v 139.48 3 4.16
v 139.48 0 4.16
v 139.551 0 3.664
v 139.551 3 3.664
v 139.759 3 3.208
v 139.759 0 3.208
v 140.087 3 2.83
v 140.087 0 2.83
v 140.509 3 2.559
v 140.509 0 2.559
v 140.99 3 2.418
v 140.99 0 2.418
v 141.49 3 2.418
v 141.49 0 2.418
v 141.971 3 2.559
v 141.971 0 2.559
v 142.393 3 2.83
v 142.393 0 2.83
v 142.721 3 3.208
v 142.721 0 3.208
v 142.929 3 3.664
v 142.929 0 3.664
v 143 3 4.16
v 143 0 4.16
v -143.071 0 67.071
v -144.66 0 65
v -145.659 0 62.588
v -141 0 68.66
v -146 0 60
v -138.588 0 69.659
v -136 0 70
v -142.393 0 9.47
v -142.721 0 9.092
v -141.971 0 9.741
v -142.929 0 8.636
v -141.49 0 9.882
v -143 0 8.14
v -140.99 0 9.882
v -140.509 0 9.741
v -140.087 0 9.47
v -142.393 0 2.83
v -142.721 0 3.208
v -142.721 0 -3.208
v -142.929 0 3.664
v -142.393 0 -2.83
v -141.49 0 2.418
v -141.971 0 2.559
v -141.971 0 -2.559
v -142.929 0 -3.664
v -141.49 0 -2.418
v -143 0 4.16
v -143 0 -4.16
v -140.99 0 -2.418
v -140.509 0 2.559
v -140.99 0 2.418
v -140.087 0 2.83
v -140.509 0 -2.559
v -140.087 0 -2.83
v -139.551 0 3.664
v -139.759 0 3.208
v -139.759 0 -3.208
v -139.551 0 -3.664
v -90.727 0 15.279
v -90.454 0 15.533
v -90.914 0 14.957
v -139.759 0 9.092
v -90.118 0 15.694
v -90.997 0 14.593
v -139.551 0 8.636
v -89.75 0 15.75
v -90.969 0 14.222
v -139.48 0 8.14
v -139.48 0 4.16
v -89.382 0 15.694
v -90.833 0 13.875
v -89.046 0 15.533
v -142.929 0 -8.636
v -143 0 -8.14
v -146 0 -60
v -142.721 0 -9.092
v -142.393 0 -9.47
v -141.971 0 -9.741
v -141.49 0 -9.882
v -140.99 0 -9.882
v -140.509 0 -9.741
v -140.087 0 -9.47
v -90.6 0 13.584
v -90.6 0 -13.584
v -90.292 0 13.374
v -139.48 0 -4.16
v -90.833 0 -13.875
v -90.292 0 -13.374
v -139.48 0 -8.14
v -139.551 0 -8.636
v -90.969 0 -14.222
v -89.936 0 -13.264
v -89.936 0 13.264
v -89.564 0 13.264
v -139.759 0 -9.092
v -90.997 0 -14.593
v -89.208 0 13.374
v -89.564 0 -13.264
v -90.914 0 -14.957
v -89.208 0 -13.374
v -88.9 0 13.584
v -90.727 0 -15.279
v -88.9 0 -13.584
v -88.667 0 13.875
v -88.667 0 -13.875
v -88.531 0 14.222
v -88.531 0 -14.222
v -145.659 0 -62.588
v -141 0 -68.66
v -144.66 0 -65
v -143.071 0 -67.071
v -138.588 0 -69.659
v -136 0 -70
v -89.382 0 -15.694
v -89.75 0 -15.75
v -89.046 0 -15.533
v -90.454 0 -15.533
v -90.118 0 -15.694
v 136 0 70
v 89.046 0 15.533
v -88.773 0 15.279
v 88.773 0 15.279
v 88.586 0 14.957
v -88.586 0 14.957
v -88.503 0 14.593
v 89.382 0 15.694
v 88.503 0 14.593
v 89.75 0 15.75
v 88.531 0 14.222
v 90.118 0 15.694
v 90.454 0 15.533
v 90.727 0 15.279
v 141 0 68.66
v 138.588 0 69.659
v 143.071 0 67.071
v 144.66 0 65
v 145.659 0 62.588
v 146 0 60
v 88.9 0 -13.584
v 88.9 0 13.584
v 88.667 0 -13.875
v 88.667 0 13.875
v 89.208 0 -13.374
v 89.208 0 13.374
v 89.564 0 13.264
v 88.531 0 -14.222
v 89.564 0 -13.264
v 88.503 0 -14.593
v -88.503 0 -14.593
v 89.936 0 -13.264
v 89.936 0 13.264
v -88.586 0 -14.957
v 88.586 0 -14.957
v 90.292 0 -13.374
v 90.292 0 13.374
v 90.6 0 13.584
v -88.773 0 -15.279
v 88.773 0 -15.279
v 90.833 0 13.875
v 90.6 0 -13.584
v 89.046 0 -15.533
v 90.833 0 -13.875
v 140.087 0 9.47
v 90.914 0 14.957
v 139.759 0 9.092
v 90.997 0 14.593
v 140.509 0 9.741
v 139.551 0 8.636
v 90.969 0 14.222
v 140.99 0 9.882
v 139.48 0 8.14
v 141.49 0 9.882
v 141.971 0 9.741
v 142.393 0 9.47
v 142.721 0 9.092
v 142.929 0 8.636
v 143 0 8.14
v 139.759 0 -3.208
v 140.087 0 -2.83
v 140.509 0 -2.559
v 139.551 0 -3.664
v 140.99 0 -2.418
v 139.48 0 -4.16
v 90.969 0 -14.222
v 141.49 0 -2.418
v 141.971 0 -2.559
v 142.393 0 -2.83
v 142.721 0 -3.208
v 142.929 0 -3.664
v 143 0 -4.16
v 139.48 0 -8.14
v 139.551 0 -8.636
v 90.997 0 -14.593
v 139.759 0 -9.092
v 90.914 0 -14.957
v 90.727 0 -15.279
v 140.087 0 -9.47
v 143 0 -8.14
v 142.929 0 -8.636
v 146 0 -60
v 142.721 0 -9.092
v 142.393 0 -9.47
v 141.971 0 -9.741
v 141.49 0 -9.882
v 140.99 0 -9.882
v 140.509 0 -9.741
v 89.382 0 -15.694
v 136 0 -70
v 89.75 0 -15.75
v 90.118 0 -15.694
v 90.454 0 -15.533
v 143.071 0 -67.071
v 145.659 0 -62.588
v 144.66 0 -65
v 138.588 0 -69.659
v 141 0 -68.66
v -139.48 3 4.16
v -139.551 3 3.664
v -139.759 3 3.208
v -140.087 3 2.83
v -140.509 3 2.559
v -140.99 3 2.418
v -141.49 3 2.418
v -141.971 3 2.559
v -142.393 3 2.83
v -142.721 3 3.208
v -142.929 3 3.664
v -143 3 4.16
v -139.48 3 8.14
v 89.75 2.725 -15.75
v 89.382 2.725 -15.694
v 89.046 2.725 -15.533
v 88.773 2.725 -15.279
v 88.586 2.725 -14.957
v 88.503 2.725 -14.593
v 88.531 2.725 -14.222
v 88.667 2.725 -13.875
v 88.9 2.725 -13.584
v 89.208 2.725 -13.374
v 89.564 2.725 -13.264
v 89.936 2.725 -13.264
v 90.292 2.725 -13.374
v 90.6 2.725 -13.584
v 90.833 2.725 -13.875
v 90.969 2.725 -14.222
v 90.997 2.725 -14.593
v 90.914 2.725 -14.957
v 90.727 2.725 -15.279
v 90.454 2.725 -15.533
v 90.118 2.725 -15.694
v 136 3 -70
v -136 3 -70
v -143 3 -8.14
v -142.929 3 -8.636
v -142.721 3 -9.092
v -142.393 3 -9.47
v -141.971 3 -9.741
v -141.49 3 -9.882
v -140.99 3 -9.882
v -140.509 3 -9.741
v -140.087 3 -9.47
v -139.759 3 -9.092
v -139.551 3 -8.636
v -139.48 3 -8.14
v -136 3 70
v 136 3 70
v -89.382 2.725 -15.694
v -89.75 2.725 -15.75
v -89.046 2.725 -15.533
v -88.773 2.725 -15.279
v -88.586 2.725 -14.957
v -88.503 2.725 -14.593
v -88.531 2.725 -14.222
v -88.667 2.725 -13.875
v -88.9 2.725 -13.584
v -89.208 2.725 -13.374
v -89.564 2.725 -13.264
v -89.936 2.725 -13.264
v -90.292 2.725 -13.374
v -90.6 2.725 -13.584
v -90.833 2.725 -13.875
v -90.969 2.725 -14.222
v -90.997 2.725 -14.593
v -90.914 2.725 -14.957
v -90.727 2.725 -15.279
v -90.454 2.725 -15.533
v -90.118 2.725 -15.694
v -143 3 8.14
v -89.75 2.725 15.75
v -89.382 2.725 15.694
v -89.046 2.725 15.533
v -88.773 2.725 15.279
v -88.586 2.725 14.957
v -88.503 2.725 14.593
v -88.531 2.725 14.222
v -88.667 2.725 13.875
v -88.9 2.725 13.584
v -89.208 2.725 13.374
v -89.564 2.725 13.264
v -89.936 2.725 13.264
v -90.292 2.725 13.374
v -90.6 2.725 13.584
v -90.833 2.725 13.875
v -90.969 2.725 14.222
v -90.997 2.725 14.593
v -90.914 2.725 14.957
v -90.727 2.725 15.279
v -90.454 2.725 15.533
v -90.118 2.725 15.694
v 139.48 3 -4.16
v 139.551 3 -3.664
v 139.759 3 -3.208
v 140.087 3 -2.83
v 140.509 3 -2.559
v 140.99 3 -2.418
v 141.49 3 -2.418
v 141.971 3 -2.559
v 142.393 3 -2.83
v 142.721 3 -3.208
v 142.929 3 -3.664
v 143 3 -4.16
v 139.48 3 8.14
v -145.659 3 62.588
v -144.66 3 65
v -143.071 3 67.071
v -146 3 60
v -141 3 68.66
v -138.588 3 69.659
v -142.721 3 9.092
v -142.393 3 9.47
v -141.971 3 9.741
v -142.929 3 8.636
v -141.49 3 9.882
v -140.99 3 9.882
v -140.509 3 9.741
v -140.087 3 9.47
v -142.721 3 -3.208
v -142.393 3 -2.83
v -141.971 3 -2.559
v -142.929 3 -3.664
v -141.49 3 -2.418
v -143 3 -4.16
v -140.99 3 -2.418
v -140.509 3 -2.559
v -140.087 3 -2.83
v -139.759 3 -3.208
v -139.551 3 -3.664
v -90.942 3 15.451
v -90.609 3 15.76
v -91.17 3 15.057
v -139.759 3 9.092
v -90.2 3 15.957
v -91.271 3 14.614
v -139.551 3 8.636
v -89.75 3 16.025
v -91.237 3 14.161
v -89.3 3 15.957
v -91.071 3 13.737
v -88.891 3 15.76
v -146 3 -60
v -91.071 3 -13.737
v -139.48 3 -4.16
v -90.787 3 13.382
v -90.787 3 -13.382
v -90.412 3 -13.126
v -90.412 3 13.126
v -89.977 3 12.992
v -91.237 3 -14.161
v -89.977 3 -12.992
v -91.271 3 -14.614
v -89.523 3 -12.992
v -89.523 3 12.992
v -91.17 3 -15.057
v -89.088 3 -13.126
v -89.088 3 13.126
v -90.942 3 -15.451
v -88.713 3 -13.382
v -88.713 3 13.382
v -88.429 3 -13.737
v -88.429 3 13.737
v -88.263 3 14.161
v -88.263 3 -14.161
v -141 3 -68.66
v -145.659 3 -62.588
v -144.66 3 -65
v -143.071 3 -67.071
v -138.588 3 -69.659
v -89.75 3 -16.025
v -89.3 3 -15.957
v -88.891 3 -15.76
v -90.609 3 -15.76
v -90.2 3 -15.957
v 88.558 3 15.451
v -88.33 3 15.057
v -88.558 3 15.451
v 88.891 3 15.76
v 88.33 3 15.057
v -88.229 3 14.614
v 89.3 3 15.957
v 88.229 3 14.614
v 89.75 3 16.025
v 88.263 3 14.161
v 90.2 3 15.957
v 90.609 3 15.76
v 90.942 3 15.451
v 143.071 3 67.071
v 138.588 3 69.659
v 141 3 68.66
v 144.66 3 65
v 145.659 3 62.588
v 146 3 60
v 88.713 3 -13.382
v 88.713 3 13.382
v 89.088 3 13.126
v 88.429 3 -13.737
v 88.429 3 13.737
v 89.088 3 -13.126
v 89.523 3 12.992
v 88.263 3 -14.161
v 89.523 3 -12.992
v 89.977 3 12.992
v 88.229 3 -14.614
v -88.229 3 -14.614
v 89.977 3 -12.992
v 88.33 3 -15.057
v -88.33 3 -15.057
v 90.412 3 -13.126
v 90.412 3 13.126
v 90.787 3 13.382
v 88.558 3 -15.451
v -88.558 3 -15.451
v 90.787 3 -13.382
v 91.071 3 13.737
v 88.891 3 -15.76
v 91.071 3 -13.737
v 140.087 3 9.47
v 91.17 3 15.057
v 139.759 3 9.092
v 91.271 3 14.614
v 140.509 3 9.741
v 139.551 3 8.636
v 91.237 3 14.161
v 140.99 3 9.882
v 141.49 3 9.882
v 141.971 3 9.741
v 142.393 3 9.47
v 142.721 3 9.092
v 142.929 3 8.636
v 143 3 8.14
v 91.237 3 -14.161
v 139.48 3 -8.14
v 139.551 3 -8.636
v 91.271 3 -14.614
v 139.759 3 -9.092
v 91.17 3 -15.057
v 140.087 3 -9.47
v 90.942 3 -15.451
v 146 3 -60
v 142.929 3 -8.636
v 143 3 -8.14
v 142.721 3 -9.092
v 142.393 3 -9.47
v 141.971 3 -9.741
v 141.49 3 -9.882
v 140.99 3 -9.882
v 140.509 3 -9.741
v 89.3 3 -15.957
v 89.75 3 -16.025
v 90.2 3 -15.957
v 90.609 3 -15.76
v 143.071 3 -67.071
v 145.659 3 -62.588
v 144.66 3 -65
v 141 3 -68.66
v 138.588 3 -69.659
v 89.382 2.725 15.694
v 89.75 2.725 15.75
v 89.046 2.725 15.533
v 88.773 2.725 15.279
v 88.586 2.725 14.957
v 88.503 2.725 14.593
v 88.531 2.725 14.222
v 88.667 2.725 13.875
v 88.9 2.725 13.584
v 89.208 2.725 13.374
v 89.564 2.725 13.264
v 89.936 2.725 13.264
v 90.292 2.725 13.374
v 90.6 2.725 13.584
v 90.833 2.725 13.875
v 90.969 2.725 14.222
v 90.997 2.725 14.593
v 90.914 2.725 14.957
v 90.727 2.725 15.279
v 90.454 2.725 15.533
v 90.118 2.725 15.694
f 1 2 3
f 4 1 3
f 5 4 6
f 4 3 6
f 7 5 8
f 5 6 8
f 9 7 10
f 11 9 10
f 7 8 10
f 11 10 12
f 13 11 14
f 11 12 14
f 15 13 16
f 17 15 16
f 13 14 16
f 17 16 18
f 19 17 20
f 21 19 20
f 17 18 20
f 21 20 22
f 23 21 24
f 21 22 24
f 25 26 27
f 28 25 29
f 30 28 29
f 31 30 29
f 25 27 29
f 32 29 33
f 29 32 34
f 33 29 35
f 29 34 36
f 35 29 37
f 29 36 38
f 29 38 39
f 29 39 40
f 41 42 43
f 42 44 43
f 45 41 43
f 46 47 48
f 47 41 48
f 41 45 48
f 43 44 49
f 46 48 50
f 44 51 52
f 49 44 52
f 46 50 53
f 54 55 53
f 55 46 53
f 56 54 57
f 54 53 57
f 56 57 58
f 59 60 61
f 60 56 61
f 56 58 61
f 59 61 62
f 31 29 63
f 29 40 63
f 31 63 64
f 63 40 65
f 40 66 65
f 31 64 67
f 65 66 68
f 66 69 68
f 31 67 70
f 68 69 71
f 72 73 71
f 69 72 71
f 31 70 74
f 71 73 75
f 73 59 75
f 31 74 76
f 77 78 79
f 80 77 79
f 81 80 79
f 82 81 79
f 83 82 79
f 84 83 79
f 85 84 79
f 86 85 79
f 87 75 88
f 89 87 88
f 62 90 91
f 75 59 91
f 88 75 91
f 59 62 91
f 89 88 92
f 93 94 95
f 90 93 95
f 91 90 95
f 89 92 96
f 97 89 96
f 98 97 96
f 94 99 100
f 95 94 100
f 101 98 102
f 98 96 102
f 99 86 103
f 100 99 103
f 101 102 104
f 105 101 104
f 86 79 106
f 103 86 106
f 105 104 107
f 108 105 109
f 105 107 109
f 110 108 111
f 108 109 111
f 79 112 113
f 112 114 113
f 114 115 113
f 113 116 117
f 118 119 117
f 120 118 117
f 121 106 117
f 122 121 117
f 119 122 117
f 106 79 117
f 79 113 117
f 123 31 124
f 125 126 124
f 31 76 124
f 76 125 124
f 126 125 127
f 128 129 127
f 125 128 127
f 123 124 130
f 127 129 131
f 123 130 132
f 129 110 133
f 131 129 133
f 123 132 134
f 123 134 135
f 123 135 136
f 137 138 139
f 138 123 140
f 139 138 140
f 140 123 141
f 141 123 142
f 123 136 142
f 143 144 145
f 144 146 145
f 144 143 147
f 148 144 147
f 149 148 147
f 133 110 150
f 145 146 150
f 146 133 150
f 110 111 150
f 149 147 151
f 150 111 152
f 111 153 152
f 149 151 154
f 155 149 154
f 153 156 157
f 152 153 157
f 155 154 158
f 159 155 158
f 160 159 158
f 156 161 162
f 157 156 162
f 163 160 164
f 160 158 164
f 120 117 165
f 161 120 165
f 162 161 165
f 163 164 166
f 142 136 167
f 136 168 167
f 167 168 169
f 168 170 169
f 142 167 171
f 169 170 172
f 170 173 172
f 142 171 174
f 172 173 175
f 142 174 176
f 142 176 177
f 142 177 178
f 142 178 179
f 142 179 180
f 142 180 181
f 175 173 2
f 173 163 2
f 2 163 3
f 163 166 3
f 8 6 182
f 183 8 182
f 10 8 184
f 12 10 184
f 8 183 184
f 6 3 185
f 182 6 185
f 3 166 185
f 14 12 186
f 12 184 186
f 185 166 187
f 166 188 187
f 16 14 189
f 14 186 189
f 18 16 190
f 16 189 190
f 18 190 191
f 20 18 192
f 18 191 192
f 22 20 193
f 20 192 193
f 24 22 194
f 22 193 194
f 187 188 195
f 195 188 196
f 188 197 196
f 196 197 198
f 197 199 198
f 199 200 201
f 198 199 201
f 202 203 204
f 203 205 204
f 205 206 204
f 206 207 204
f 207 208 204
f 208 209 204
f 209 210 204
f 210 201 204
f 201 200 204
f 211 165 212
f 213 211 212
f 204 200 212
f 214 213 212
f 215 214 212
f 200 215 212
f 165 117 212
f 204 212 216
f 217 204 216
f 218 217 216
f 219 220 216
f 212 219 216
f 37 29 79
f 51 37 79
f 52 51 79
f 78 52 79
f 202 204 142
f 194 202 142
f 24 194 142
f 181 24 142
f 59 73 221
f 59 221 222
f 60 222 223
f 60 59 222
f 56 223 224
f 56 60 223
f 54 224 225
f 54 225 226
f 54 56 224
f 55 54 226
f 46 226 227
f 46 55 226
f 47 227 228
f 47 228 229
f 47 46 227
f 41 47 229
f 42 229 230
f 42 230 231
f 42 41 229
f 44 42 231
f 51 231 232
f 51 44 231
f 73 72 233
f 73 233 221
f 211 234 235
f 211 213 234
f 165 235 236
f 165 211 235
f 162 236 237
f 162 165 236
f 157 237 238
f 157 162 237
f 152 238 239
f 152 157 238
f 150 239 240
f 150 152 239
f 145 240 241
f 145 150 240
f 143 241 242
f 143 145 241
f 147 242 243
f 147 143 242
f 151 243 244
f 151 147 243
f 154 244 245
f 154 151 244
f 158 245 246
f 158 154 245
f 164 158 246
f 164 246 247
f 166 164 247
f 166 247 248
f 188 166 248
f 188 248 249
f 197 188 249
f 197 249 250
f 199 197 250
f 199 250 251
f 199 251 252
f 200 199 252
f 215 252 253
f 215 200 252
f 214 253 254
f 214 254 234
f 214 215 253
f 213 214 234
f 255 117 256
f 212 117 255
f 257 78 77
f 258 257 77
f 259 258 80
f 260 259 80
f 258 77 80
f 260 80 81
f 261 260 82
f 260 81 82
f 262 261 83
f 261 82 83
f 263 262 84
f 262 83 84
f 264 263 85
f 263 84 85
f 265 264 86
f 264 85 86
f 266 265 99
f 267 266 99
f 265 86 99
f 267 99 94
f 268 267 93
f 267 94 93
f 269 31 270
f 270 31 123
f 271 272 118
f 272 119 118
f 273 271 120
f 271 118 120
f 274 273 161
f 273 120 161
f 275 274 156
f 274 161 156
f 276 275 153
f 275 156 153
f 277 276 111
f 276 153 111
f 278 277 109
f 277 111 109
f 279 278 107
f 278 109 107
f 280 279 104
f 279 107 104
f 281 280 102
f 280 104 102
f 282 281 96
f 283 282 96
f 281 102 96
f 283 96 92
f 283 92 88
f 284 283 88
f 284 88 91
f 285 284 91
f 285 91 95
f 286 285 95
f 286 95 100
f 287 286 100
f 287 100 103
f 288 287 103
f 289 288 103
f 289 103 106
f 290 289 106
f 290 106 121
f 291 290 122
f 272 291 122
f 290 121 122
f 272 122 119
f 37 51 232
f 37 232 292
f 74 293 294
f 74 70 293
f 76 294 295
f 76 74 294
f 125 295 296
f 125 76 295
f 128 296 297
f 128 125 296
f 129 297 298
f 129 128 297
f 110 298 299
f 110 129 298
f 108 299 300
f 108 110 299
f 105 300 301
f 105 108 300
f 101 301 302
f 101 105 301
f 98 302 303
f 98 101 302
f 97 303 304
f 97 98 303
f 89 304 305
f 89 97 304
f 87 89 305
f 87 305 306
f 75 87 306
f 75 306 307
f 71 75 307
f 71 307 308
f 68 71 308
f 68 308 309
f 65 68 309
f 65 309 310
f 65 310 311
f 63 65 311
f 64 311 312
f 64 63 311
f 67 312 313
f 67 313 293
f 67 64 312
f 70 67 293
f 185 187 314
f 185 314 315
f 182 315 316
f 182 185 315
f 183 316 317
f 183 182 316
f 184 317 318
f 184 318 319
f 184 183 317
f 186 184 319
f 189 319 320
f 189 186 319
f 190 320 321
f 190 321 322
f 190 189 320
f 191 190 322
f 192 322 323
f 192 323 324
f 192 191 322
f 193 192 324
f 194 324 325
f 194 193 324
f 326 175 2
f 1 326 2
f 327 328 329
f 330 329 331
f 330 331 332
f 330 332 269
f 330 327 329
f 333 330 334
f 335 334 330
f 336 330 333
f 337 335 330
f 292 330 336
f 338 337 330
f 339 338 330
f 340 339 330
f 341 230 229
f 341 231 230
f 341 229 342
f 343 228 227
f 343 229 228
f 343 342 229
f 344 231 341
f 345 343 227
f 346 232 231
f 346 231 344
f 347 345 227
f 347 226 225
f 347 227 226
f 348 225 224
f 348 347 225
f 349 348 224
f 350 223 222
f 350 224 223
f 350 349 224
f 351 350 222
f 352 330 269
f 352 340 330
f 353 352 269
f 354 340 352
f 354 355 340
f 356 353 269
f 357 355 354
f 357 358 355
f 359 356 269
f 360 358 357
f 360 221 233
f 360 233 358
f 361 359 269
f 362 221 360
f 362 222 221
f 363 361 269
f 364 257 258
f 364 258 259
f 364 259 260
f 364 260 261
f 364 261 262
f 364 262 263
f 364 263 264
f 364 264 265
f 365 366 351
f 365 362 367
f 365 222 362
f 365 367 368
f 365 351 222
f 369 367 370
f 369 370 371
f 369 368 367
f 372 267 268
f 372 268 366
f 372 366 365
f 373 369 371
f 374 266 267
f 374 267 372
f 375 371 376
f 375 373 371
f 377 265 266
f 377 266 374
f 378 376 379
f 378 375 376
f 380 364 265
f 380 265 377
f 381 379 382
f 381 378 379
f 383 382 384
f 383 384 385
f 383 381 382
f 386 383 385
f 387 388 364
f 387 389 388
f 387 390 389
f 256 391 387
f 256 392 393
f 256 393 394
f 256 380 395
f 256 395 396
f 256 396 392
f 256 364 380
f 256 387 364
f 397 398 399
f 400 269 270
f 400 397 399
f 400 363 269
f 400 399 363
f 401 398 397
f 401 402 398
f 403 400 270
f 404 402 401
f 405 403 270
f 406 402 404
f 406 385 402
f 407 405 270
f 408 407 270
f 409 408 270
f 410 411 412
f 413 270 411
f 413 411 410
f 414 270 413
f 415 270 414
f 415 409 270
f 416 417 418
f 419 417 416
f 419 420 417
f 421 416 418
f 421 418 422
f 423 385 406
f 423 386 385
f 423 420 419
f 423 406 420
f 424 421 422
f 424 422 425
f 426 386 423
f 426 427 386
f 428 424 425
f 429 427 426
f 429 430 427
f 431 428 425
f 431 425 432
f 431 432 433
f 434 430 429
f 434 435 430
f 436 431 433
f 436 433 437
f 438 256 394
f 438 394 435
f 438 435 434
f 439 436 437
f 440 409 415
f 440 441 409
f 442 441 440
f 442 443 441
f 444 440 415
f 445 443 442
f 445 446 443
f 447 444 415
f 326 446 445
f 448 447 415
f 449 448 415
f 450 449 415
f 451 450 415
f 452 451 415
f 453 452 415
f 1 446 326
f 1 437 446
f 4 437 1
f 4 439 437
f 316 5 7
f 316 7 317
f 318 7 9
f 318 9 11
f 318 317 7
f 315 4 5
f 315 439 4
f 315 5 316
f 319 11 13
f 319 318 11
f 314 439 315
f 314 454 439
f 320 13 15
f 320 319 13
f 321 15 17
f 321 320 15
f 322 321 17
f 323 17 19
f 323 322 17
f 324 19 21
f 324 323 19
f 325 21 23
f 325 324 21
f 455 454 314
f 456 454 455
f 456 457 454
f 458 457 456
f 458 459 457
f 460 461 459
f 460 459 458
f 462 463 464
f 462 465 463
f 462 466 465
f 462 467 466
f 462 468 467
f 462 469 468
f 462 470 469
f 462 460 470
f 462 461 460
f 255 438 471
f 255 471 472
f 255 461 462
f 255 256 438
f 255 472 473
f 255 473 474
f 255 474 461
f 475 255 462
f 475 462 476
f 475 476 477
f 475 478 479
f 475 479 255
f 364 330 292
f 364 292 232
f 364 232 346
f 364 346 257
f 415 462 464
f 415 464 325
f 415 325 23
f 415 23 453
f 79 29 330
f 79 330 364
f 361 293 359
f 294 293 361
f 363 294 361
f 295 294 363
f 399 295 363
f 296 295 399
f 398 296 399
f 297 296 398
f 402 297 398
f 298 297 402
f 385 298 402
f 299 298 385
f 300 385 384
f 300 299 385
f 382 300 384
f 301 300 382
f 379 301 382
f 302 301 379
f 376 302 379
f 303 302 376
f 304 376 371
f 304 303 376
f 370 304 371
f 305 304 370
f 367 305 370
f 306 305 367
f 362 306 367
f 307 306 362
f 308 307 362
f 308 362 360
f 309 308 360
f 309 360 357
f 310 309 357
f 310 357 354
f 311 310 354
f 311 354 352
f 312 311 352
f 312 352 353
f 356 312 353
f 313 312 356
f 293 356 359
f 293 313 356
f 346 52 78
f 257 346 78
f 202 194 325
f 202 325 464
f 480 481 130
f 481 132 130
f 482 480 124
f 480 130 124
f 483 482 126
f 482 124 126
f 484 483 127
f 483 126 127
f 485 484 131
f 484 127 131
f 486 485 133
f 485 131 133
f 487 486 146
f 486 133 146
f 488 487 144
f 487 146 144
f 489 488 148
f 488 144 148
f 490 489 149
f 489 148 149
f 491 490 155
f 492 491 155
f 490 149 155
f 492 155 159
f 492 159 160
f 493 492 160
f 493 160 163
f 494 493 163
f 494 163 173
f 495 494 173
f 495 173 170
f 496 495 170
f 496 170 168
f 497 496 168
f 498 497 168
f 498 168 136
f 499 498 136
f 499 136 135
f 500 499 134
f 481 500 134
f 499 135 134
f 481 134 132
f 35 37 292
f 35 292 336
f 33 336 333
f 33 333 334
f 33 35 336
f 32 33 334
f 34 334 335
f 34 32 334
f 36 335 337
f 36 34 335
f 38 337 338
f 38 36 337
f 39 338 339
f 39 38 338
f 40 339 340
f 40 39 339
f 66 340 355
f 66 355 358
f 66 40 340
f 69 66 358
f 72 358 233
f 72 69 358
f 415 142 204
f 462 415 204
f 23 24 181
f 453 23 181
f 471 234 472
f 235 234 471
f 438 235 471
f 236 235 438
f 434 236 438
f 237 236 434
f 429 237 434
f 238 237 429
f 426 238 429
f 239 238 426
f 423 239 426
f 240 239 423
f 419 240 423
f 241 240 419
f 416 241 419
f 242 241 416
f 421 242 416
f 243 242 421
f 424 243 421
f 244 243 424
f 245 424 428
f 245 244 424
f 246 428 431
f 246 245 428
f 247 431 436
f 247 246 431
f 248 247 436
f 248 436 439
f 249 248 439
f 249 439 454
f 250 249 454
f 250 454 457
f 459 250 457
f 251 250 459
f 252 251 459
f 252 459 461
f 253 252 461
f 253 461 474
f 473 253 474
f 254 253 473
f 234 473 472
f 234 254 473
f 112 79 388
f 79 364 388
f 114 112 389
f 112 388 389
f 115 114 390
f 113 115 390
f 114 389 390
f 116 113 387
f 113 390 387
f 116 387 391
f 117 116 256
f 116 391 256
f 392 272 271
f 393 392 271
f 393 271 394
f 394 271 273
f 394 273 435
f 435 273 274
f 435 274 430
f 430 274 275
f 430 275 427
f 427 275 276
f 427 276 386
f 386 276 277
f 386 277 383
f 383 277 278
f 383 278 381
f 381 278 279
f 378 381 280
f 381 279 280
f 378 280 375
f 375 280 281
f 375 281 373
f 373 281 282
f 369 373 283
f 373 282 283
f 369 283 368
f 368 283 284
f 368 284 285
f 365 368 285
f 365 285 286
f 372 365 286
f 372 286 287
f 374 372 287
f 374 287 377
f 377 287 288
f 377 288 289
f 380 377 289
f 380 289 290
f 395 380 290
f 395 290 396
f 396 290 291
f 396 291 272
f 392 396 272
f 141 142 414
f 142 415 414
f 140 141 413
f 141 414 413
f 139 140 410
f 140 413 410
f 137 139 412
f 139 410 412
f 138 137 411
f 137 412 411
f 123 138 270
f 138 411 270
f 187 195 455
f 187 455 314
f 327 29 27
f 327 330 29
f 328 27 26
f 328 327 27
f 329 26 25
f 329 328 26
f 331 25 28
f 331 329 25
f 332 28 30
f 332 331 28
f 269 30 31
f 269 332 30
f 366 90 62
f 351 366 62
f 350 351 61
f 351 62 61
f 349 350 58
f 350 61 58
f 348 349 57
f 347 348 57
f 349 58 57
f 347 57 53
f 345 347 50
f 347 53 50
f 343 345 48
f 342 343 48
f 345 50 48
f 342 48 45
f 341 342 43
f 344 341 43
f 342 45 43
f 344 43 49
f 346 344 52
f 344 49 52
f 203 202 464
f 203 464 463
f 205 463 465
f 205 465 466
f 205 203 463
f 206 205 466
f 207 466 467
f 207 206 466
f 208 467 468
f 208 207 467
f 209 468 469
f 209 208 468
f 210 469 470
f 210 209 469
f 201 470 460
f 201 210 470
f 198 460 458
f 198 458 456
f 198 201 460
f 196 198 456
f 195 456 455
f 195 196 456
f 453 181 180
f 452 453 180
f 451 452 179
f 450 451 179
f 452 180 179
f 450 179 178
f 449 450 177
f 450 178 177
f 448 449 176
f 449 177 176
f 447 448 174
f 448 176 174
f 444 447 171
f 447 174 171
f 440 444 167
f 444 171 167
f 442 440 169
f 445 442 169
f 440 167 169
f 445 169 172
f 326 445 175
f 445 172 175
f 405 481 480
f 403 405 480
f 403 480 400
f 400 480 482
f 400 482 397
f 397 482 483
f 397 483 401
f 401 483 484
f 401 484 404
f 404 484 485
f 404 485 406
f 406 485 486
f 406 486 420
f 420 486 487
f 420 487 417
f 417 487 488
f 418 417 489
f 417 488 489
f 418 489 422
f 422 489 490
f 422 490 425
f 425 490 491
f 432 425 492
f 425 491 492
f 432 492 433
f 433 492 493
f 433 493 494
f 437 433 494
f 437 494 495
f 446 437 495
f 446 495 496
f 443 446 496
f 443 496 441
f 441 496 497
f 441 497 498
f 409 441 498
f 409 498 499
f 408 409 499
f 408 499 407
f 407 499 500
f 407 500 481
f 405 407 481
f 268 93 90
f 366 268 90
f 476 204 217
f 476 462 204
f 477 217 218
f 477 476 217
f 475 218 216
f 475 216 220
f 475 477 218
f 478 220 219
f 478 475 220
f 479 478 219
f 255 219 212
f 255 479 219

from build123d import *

# Parameters (mm, degrees)
SKETCH_1_W                   = 292
SKETCH_1_H                   = 140
EXTRUDE_1_DEPTH              = 3
HOLE_WIZARD_M3_1_D           = 2.5
HOLE_WIZARD_M3_1_CSINK_D     = 3.05
HOLE_WIZARD_M3_1_CSINK_ANGLE = 90
MIRROR_2_COPY_1_D            = 2.5
MIRROR_2_COPY_1_CSINK_D      = 3.05
MIRROR_2_COPY_1_CSINK_ANGLE  = 90
FILLET_1_R                   = 10


with BuildPart() as part:
    # 草图1 → 凸台-拉伸1 (new body)
    with BuildSketch(Plane(origin=(0, 0, 0), x_dir=(1, 0, 0), z_dir=(0, 1, 0))):
        Rectangle(SKETCH_1_W, SKETCH_1_H)
        with BuildLine():
            Line((-139.48, 8.14), (-139.48, 4.16))
            ThreePointArc((-139.48, 4.16), (-141.24, 2.4), (-143, 4.16))
            Line((-143, 4.16), (-143, 8.14))
            ThreePointArc((-143, 8.14), (-141.24, 9.9), (-139.48, 8.14))
        make_face(mode=Mode.SUBTRACT)
        with BuildLine():
            Line((-139.48, -8.14), (-139.48, -4.16))
            ThreePointArc((-139.48, -4.16), (-141.24, -2.4), (-143, -4.16))
            Line((-143, -4.16), (-143, -8.14))
            ThreePointArc((-143, -8.14), (-141.24, -9.9), (-139.48, -8.14))
        make_face(mode=Mode.SUBTRACT)
        with BuildLine():
            Line((139.48, 8.14), (139.48, 4.16))
            ThreePointArc((139.48, 4.16), (141.24, 2.4), (143, 4.16))
            Line((143, 4.16), (143, 8.14))
            ThreePointArc((143, 8.14), (141.24, 9.9), (139.48, 8.14))
        make_face(mode=Mode.SUBTRACT)
        with BuildLine():
            Line((139.48, -8.14), (139.48, -4.16))
            ThreePointArc((139.48, -4.16), (141.24, -2.4), (143, -4.16))
            Line((143, -4.16), (143, -8.14))
            ThreePointArc((143, -8.14), (141.24, -9.9), (139.48, -8.14))
        make_face(mode=Mode.SUBTRACT)
    extrude(amount=EXTRUDE_1_DEPTH)

    # M3 螺纹孔1 (through all)
    with Locations(Plane(origin=(-89.75, 3, -14.5), x_dir=(0, 0, 1), z_dir=(0, 1, 0))):
        with Locations((0, 0)):
            hole_wizard_m3_1 = CounterSinkHole(HOLE_WIZARD_M3_1_D / 2, HOLE_WIZARD_M3_1_CSINK_D / 2, counter_sink_angle=HOLE_WIZARD_M3_1_CSINK_ANGLE)

    # 镜向1: M3 螺纹孔1 across plane
    add(hole_wizard_m3_1.mirror(Plane(origin=(0, 0, 0), x_dir=(0, 0, 1), z_dir=(1, 0, 0))), mode=Mode.SUBTRACT)

    # 镜向2: M3 螺纹孔1 across plane
    add(hole_wizard_m3_1.mirror(Plane.XY), mode=Mode.SUBTRACT)

    # 镜向2 copy 1 (through all)
    with Locations(Plane(origin=(89.75, 3, 14.5), x_dir=(0, 0, -1), z_dir=(0, 1, 0))):
        with Locations((0, 0)):
            CounterSinkHole(MIRROR_2_COPY_1_D / 2, MIRROR_2_COPY_1_CSINK_D / 2, counter_sink_angle=MIRROR_2_COPY_1_CSINK_ANGLE)

    # 圆角1
    fillet_1_edges = [part.edges().sort_by_distance(p)[0] for p in [
        (146, 1.5, 70),
        (-146, 1.5, 70),
        (-146, 1.5, -70),
        (146, 1.5, -70),
    ]]
    fillet(fillet_1_edges, radius=FILLET_1_R)


solid = part.part
